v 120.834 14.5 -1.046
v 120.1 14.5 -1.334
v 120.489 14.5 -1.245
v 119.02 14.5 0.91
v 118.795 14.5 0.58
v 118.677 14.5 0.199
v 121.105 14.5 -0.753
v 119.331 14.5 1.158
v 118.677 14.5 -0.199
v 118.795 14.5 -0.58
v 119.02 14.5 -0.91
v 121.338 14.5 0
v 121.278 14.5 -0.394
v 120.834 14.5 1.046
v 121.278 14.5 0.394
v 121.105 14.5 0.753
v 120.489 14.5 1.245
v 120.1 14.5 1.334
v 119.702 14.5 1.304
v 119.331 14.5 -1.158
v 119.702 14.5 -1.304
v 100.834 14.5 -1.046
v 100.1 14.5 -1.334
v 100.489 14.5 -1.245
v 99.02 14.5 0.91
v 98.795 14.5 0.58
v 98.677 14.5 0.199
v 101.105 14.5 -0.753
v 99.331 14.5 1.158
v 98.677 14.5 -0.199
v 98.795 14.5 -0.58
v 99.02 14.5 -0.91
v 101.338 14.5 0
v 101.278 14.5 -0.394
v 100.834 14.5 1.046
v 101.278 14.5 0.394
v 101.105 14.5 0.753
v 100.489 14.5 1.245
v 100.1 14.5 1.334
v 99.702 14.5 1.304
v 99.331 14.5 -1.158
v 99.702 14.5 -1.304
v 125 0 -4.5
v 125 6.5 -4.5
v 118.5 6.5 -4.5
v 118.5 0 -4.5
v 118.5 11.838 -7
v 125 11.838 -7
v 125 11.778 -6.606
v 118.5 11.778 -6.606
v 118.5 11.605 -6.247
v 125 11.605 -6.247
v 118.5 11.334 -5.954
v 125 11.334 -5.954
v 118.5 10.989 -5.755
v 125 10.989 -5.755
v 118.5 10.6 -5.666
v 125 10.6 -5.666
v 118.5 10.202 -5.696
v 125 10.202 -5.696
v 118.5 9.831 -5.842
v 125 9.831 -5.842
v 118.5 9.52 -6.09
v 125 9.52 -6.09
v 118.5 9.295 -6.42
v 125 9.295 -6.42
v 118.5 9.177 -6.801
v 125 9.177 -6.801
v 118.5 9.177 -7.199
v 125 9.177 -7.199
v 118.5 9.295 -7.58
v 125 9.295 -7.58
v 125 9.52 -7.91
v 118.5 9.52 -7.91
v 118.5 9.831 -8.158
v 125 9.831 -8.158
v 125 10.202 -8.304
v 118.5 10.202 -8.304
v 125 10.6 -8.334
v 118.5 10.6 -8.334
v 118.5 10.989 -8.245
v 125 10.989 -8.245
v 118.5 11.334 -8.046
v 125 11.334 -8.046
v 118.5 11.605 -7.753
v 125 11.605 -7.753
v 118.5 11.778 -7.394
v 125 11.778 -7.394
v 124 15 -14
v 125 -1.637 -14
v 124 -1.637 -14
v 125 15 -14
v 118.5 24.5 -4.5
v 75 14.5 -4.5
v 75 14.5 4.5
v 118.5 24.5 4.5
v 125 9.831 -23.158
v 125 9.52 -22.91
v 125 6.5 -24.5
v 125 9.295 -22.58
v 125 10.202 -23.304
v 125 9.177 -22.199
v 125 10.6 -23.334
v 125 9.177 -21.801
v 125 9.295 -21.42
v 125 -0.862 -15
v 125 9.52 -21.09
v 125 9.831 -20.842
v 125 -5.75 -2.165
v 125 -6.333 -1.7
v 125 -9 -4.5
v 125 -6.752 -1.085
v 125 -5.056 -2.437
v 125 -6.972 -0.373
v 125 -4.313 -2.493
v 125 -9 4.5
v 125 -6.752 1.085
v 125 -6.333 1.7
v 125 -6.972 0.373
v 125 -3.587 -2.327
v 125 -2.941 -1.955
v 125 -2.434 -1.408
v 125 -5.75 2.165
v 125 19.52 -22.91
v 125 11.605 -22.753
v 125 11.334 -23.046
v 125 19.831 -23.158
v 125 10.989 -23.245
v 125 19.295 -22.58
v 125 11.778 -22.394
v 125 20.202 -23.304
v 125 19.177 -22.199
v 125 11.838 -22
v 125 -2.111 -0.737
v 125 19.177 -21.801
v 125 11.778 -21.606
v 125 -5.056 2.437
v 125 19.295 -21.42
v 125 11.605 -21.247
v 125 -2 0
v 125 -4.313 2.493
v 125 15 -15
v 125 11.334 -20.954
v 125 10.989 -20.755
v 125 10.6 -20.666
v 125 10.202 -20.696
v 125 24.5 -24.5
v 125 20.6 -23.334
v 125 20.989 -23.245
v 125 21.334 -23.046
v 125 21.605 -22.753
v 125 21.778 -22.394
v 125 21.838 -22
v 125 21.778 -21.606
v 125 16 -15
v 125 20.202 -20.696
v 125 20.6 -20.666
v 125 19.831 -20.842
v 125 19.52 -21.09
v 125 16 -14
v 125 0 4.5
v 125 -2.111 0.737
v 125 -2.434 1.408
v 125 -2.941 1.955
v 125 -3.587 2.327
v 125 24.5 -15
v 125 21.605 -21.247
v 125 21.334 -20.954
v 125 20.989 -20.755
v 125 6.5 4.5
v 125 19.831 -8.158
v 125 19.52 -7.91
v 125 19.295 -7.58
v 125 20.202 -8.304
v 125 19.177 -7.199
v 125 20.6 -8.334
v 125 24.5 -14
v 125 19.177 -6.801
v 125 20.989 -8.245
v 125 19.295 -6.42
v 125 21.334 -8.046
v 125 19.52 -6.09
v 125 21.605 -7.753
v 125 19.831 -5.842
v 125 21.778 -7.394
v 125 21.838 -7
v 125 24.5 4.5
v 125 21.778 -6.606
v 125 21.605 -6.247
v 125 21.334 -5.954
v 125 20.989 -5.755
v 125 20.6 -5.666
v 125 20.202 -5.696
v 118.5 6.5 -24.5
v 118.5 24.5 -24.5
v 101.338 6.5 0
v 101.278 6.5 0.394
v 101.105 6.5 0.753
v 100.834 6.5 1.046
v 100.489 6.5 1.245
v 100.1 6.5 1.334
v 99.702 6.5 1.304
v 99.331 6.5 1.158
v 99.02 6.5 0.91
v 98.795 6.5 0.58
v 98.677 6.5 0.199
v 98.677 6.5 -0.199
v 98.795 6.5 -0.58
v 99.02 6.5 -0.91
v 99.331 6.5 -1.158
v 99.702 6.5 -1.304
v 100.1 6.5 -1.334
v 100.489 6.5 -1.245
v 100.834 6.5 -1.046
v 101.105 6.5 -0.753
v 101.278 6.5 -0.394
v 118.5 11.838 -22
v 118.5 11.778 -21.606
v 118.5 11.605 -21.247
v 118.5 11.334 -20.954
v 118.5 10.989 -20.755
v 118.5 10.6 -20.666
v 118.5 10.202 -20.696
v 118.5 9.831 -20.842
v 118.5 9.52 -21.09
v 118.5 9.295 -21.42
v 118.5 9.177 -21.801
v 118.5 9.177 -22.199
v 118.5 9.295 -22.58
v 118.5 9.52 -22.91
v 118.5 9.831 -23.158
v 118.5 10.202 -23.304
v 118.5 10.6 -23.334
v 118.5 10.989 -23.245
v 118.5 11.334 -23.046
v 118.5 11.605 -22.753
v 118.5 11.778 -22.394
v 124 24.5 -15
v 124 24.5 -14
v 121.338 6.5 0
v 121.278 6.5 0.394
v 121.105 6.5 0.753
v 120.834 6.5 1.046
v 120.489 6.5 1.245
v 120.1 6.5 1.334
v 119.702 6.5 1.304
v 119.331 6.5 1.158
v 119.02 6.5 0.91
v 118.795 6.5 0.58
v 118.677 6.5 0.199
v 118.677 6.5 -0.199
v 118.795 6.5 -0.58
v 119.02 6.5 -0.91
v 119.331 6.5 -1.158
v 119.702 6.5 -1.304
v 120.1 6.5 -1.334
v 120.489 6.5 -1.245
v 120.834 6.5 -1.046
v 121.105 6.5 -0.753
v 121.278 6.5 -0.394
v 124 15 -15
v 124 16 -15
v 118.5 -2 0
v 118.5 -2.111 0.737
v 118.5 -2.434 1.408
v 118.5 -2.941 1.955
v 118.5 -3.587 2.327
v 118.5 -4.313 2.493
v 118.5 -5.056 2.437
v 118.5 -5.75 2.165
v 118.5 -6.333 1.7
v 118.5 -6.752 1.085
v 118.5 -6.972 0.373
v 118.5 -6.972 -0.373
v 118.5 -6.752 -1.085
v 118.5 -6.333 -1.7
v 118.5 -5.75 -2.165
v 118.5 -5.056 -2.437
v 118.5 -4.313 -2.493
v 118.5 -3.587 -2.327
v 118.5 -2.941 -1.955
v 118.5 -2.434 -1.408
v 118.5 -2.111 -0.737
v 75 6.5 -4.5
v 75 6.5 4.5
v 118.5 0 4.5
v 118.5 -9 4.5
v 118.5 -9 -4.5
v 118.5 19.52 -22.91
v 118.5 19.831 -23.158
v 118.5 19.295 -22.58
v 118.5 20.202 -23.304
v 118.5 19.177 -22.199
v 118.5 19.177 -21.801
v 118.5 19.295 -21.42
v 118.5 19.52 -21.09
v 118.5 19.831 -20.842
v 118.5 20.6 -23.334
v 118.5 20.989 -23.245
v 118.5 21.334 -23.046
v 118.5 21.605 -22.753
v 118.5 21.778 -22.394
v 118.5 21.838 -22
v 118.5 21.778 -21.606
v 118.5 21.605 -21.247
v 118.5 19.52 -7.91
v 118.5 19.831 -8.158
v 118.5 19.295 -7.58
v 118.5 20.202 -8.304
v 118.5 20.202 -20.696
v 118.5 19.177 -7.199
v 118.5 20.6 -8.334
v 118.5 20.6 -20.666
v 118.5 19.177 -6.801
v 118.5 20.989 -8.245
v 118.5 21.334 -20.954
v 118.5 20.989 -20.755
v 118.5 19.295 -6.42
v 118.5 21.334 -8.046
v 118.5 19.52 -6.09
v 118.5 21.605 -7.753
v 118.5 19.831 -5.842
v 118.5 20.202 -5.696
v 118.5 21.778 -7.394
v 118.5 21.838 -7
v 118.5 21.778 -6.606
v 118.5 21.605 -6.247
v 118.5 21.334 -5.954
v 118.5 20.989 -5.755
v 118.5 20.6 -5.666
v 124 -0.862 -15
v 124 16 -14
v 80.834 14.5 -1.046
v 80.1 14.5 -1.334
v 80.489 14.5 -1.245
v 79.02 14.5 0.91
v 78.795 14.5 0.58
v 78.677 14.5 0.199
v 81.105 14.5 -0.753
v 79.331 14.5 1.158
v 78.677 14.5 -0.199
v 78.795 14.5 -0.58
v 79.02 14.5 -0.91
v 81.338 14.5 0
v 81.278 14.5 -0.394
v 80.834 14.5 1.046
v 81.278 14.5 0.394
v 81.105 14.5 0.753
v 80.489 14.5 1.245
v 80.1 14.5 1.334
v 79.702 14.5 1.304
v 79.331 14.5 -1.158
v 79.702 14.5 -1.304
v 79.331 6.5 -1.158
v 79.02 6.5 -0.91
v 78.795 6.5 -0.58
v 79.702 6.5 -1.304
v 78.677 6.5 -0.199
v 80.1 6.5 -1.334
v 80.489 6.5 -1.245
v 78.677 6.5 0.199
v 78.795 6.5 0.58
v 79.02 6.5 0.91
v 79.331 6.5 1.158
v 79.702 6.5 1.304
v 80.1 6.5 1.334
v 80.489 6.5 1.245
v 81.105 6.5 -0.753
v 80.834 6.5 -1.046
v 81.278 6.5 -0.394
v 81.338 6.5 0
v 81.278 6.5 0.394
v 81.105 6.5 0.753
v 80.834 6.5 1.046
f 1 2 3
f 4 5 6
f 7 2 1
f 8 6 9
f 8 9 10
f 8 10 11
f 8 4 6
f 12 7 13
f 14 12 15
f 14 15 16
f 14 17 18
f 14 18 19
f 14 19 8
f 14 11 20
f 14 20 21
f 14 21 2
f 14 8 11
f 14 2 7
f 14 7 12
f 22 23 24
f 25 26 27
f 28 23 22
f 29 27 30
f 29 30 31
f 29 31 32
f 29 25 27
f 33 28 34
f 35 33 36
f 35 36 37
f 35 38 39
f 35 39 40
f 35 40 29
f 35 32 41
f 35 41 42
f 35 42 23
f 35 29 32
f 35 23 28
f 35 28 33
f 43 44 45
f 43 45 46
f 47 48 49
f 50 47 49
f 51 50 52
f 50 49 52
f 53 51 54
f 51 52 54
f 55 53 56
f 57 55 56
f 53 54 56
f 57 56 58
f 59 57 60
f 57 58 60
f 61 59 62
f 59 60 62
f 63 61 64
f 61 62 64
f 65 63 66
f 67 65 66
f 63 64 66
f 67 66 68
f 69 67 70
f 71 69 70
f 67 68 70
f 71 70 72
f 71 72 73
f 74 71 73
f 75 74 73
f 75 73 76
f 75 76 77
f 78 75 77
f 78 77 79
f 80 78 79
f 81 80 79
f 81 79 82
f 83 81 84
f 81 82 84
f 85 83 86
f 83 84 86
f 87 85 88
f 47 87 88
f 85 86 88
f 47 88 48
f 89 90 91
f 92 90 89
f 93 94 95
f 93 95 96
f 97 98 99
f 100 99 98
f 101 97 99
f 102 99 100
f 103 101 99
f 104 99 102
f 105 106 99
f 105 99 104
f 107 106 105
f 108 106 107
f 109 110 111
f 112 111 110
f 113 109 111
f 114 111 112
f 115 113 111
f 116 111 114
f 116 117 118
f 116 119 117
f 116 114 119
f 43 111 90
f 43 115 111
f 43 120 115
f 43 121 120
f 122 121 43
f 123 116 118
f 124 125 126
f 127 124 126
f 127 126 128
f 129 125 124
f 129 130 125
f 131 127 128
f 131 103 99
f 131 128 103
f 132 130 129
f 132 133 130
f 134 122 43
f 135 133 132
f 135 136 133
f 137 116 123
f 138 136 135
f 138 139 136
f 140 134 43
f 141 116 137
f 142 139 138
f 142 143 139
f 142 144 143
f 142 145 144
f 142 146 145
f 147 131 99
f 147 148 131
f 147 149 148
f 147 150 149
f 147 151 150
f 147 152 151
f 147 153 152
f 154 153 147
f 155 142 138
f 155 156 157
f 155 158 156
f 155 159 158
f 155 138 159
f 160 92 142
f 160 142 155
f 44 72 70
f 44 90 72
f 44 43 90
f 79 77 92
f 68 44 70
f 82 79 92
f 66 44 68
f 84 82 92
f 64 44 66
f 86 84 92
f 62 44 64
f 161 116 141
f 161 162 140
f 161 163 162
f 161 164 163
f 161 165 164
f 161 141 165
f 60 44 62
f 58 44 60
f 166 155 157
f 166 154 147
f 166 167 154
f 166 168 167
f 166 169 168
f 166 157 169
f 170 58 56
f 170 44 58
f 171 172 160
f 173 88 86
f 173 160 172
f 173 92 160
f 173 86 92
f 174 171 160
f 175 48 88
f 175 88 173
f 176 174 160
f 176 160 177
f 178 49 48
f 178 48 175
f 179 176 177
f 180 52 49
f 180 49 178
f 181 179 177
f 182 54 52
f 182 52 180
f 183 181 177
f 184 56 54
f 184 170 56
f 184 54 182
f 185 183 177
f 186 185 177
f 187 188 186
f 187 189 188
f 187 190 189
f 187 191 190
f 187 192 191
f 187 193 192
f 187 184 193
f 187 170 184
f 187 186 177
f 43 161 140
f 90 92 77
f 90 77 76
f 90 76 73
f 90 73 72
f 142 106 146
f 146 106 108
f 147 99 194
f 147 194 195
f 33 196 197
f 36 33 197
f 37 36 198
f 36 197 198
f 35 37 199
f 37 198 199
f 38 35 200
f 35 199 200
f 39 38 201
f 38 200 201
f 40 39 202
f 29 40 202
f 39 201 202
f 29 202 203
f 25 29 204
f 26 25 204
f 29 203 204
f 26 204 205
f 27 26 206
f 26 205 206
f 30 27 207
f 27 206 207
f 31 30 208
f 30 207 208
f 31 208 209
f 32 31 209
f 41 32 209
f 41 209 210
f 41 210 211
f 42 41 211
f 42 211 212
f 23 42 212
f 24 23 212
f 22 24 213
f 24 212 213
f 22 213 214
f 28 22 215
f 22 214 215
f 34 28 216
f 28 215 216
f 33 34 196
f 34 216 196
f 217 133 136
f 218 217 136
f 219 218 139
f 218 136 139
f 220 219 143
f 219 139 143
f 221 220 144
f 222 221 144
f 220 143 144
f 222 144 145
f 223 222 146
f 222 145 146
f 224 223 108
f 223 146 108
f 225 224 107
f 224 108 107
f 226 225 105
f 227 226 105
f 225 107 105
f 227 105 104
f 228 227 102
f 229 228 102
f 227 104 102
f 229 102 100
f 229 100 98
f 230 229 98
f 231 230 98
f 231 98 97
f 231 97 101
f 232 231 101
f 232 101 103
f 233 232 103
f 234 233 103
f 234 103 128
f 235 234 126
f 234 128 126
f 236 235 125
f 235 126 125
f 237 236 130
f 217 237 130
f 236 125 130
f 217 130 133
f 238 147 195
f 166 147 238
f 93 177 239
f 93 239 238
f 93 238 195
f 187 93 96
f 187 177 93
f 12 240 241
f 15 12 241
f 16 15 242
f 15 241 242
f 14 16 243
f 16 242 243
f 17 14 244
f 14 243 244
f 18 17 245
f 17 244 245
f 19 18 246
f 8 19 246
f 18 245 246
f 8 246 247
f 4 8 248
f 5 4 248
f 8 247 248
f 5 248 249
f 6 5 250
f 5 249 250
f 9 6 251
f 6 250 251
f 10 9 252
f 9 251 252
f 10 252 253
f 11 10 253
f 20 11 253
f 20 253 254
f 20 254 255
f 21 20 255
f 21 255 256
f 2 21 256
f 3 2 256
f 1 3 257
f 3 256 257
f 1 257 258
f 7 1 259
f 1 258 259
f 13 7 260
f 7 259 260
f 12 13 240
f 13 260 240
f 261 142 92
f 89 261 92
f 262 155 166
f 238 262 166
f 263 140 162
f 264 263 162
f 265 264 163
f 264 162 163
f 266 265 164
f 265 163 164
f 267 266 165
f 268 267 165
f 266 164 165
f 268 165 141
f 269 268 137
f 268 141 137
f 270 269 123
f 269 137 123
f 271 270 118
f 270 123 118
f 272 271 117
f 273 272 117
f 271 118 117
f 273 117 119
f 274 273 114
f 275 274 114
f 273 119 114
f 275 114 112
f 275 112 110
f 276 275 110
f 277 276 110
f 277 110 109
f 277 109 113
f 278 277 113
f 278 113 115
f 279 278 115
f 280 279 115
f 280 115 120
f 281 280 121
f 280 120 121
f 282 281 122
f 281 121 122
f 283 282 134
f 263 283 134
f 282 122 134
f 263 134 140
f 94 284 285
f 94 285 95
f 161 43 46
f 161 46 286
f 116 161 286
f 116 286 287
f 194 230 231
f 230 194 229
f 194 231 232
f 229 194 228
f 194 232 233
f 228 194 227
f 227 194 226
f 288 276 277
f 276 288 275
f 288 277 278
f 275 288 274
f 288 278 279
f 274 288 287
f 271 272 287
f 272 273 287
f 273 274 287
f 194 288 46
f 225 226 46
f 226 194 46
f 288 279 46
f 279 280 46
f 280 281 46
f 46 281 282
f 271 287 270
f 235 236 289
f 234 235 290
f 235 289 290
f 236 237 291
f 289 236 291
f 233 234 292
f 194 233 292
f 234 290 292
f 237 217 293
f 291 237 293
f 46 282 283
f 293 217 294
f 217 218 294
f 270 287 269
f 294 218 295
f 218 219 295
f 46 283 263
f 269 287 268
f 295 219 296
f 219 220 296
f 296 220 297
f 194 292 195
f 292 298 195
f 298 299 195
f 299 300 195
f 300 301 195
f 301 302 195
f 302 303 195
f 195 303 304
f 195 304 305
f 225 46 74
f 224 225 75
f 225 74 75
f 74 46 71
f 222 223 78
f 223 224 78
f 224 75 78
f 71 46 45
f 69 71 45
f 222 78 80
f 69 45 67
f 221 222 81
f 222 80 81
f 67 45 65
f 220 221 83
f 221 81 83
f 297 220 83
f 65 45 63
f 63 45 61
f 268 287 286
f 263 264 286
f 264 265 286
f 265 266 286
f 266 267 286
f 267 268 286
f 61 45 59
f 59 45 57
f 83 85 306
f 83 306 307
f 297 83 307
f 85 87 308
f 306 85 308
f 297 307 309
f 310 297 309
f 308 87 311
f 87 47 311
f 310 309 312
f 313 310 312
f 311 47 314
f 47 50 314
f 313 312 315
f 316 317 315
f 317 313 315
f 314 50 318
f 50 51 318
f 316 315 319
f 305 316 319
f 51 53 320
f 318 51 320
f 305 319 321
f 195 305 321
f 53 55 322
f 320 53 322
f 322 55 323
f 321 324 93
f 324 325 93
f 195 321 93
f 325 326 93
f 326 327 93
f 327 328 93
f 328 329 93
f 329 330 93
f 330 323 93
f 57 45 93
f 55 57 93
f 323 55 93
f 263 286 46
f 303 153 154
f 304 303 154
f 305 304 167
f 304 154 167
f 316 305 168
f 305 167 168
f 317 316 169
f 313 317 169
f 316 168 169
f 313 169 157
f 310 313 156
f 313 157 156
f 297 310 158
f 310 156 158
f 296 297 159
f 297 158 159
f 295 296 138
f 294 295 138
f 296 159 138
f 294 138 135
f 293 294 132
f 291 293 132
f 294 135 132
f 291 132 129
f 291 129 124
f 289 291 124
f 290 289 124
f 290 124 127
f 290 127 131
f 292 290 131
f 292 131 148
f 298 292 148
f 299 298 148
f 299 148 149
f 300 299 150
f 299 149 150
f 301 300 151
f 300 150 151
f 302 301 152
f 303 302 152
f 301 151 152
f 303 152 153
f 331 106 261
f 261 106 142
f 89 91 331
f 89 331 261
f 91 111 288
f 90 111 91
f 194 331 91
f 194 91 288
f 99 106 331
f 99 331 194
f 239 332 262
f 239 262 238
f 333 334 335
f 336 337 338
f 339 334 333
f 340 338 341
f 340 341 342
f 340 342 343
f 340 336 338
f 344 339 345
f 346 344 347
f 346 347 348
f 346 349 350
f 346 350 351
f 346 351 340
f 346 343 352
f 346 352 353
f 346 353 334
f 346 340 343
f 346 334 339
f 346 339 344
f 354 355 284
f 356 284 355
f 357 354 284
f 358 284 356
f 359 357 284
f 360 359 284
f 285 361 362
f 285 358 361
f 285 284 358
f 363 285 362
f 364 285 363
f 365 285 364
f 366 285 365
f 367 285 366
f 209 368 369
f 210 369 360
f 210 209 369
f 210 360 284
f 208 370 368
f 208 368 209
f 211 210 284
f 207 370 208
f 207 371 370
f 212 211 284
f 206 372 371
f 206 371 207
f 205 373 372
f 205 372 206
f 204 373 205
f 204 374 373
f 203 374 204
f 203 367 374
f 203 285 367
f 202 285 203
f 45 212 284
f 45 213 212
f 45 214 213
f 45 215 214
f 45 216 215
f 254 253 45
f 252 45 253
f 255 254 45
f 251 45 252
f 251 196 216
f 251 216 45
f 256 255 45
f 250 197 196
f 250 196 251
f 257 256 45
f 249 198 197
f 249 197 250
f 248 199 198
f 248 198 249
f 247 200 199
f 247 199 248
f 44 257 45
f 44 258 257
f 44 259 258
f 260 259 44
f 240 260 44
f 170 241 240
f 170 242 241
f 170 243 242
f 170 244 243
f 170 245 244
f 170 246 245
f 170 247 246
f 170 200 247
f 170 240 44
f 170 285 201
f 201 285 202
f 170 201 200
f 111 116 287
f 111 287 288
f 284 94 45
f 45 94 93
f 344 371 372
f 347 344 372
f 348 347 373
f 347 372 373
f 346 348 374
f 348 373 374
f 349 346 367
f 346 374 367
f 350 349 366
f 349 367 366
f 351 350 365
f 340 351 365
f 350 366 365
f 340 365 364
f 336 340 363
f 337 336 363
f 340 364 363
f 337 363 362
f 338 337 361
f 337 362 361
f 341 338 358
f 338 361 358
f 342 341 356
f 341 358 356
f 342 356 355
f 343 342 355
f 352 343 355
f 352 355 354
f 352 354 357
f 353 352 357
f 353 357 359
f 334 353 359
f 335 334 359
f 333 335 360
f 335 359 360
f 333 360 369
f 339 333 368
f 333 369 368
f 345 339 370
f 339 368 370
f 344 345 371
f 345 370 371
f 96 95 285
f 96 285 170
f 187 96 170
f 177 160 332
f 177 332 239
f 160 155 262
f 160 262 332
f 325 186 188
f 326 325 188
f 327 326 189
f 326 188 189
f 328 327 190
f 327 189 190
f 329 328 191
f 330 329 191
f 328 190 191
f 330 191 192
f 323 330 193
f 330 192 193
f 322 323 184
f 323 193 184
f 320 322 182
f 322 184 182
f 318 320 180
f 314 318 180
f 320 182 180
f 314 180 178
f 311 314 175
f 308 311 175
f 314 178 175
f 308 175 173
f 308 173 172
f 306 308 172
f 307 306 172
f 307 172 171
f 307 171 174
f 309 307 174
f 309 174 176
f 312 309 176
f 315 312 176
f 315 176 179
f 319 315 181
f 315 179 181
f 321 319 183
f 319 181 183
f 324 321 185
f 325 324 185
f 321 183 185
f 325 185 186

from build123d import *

# Parameters (mm, degrees)
SKETCH018_W     = 50
SKETCH018_H     = 18
PAD011_DEPTH    = 4.5
SKETCH019_R     = 1.3375
POCKET006_DEPTH = 8
POCKET007_DEPTH = 9.001
SKETCH053_R     = 1.3375
SKETCH053_R_2   = 2.5
PAD029_DEPTH    = 6.5
SKETCH055_W     = 8.5
SKETCH055_H     = 1
SKETCH055_W_2   = 24
POCKET024_DEPTH = 1


with BuildPart() as part:
    # Sketch018 → Pad011 (new body, symmetric)
    with BuildSketch(Plane.XY):
        with Locations((25, 9)):
            Rectangle(SKETCH018_W, SKETCH018_H)
    extrude(amount=PAD011_DEPTH, both=True)

    # Sketch019 → Pocket006 (cut)
    with BuildSketch(Plane.XZ):
        with Locations((5, 0)):
            Circle(SKETCH019_R)
        with Locations((25, 0)):
            Circle(SKETCH019_R)
        with Locations((45, 0)):
            Circle(SKETCH019_R)
    extrude(amount=-POCKET006_DEPTH, mode=Mode.SUBTRACT)

    # Sketch020 (on Face4 of Pocket006) → Pocket007 (cut, through all)
    with BuildSketch(Plane(origin=(0, 0, -4.5), x_dir=(1, 0, 0), z_dir=(0, 0, -1))):
        Polygon((0, -8), (43.5, -18), (0, -18), align=None)
    extrude(amount=-POCKET007_DEPTH, mode=Mode.SUBTRACT)

    # Sketch053 → Pad029 (join)
    with BuildSketch(Plane.YZ.offset(50)):
        Polygon((18, -4.5), (-6.5, -4.5), (-6.5, 4.5), (-15.5, 4.5), (-15.5, -4.5), (0, -24.5), (18, -24.5), align=None)
        with Locations((14, -7)):
            Circle(SKETCH053_R, mode=Mode.SUBTRACT)
        with Locations((4, -7)):
            Circle(SKETCH053_R, mode=Mode.SUBTRACT)
        with Locations((4, -22)):
            Circle(SKETCH053_R, mode=Mode.SUBTRACT)
        with Locations((14, -22)):
            Circle(SKETCH053_R, mode=Mode.SUBTRACT)
        with Locations((-11, 0)):
            Circle(SKETCH053_R_2, mode=Mode.SUBTRACT)
    extrude(amount=-PAD029_DEPTH)

    # Sketch055 (on Face7 of Pad029) → Pocket024 (cut)
    with BuildSketch(Plane.YZ.offset(50)):
        with Locations((13.75, -14.5)):
            Rectangle(SKETCH055_W, SKETCH055_H)
        with Locations((-3.5, -14.5)):
            Rectangle(SKETCH055_W_2, SKETCH055_H)
    extrude(amount=-POCKET024_DEPTH, mode=Mode.SUBTRACT)


with BuildPart() as part_1:
    # Body005 placement: moved
    add(part.part.moved(Location((75, 6.5, 0))))


solid = part_1.part
